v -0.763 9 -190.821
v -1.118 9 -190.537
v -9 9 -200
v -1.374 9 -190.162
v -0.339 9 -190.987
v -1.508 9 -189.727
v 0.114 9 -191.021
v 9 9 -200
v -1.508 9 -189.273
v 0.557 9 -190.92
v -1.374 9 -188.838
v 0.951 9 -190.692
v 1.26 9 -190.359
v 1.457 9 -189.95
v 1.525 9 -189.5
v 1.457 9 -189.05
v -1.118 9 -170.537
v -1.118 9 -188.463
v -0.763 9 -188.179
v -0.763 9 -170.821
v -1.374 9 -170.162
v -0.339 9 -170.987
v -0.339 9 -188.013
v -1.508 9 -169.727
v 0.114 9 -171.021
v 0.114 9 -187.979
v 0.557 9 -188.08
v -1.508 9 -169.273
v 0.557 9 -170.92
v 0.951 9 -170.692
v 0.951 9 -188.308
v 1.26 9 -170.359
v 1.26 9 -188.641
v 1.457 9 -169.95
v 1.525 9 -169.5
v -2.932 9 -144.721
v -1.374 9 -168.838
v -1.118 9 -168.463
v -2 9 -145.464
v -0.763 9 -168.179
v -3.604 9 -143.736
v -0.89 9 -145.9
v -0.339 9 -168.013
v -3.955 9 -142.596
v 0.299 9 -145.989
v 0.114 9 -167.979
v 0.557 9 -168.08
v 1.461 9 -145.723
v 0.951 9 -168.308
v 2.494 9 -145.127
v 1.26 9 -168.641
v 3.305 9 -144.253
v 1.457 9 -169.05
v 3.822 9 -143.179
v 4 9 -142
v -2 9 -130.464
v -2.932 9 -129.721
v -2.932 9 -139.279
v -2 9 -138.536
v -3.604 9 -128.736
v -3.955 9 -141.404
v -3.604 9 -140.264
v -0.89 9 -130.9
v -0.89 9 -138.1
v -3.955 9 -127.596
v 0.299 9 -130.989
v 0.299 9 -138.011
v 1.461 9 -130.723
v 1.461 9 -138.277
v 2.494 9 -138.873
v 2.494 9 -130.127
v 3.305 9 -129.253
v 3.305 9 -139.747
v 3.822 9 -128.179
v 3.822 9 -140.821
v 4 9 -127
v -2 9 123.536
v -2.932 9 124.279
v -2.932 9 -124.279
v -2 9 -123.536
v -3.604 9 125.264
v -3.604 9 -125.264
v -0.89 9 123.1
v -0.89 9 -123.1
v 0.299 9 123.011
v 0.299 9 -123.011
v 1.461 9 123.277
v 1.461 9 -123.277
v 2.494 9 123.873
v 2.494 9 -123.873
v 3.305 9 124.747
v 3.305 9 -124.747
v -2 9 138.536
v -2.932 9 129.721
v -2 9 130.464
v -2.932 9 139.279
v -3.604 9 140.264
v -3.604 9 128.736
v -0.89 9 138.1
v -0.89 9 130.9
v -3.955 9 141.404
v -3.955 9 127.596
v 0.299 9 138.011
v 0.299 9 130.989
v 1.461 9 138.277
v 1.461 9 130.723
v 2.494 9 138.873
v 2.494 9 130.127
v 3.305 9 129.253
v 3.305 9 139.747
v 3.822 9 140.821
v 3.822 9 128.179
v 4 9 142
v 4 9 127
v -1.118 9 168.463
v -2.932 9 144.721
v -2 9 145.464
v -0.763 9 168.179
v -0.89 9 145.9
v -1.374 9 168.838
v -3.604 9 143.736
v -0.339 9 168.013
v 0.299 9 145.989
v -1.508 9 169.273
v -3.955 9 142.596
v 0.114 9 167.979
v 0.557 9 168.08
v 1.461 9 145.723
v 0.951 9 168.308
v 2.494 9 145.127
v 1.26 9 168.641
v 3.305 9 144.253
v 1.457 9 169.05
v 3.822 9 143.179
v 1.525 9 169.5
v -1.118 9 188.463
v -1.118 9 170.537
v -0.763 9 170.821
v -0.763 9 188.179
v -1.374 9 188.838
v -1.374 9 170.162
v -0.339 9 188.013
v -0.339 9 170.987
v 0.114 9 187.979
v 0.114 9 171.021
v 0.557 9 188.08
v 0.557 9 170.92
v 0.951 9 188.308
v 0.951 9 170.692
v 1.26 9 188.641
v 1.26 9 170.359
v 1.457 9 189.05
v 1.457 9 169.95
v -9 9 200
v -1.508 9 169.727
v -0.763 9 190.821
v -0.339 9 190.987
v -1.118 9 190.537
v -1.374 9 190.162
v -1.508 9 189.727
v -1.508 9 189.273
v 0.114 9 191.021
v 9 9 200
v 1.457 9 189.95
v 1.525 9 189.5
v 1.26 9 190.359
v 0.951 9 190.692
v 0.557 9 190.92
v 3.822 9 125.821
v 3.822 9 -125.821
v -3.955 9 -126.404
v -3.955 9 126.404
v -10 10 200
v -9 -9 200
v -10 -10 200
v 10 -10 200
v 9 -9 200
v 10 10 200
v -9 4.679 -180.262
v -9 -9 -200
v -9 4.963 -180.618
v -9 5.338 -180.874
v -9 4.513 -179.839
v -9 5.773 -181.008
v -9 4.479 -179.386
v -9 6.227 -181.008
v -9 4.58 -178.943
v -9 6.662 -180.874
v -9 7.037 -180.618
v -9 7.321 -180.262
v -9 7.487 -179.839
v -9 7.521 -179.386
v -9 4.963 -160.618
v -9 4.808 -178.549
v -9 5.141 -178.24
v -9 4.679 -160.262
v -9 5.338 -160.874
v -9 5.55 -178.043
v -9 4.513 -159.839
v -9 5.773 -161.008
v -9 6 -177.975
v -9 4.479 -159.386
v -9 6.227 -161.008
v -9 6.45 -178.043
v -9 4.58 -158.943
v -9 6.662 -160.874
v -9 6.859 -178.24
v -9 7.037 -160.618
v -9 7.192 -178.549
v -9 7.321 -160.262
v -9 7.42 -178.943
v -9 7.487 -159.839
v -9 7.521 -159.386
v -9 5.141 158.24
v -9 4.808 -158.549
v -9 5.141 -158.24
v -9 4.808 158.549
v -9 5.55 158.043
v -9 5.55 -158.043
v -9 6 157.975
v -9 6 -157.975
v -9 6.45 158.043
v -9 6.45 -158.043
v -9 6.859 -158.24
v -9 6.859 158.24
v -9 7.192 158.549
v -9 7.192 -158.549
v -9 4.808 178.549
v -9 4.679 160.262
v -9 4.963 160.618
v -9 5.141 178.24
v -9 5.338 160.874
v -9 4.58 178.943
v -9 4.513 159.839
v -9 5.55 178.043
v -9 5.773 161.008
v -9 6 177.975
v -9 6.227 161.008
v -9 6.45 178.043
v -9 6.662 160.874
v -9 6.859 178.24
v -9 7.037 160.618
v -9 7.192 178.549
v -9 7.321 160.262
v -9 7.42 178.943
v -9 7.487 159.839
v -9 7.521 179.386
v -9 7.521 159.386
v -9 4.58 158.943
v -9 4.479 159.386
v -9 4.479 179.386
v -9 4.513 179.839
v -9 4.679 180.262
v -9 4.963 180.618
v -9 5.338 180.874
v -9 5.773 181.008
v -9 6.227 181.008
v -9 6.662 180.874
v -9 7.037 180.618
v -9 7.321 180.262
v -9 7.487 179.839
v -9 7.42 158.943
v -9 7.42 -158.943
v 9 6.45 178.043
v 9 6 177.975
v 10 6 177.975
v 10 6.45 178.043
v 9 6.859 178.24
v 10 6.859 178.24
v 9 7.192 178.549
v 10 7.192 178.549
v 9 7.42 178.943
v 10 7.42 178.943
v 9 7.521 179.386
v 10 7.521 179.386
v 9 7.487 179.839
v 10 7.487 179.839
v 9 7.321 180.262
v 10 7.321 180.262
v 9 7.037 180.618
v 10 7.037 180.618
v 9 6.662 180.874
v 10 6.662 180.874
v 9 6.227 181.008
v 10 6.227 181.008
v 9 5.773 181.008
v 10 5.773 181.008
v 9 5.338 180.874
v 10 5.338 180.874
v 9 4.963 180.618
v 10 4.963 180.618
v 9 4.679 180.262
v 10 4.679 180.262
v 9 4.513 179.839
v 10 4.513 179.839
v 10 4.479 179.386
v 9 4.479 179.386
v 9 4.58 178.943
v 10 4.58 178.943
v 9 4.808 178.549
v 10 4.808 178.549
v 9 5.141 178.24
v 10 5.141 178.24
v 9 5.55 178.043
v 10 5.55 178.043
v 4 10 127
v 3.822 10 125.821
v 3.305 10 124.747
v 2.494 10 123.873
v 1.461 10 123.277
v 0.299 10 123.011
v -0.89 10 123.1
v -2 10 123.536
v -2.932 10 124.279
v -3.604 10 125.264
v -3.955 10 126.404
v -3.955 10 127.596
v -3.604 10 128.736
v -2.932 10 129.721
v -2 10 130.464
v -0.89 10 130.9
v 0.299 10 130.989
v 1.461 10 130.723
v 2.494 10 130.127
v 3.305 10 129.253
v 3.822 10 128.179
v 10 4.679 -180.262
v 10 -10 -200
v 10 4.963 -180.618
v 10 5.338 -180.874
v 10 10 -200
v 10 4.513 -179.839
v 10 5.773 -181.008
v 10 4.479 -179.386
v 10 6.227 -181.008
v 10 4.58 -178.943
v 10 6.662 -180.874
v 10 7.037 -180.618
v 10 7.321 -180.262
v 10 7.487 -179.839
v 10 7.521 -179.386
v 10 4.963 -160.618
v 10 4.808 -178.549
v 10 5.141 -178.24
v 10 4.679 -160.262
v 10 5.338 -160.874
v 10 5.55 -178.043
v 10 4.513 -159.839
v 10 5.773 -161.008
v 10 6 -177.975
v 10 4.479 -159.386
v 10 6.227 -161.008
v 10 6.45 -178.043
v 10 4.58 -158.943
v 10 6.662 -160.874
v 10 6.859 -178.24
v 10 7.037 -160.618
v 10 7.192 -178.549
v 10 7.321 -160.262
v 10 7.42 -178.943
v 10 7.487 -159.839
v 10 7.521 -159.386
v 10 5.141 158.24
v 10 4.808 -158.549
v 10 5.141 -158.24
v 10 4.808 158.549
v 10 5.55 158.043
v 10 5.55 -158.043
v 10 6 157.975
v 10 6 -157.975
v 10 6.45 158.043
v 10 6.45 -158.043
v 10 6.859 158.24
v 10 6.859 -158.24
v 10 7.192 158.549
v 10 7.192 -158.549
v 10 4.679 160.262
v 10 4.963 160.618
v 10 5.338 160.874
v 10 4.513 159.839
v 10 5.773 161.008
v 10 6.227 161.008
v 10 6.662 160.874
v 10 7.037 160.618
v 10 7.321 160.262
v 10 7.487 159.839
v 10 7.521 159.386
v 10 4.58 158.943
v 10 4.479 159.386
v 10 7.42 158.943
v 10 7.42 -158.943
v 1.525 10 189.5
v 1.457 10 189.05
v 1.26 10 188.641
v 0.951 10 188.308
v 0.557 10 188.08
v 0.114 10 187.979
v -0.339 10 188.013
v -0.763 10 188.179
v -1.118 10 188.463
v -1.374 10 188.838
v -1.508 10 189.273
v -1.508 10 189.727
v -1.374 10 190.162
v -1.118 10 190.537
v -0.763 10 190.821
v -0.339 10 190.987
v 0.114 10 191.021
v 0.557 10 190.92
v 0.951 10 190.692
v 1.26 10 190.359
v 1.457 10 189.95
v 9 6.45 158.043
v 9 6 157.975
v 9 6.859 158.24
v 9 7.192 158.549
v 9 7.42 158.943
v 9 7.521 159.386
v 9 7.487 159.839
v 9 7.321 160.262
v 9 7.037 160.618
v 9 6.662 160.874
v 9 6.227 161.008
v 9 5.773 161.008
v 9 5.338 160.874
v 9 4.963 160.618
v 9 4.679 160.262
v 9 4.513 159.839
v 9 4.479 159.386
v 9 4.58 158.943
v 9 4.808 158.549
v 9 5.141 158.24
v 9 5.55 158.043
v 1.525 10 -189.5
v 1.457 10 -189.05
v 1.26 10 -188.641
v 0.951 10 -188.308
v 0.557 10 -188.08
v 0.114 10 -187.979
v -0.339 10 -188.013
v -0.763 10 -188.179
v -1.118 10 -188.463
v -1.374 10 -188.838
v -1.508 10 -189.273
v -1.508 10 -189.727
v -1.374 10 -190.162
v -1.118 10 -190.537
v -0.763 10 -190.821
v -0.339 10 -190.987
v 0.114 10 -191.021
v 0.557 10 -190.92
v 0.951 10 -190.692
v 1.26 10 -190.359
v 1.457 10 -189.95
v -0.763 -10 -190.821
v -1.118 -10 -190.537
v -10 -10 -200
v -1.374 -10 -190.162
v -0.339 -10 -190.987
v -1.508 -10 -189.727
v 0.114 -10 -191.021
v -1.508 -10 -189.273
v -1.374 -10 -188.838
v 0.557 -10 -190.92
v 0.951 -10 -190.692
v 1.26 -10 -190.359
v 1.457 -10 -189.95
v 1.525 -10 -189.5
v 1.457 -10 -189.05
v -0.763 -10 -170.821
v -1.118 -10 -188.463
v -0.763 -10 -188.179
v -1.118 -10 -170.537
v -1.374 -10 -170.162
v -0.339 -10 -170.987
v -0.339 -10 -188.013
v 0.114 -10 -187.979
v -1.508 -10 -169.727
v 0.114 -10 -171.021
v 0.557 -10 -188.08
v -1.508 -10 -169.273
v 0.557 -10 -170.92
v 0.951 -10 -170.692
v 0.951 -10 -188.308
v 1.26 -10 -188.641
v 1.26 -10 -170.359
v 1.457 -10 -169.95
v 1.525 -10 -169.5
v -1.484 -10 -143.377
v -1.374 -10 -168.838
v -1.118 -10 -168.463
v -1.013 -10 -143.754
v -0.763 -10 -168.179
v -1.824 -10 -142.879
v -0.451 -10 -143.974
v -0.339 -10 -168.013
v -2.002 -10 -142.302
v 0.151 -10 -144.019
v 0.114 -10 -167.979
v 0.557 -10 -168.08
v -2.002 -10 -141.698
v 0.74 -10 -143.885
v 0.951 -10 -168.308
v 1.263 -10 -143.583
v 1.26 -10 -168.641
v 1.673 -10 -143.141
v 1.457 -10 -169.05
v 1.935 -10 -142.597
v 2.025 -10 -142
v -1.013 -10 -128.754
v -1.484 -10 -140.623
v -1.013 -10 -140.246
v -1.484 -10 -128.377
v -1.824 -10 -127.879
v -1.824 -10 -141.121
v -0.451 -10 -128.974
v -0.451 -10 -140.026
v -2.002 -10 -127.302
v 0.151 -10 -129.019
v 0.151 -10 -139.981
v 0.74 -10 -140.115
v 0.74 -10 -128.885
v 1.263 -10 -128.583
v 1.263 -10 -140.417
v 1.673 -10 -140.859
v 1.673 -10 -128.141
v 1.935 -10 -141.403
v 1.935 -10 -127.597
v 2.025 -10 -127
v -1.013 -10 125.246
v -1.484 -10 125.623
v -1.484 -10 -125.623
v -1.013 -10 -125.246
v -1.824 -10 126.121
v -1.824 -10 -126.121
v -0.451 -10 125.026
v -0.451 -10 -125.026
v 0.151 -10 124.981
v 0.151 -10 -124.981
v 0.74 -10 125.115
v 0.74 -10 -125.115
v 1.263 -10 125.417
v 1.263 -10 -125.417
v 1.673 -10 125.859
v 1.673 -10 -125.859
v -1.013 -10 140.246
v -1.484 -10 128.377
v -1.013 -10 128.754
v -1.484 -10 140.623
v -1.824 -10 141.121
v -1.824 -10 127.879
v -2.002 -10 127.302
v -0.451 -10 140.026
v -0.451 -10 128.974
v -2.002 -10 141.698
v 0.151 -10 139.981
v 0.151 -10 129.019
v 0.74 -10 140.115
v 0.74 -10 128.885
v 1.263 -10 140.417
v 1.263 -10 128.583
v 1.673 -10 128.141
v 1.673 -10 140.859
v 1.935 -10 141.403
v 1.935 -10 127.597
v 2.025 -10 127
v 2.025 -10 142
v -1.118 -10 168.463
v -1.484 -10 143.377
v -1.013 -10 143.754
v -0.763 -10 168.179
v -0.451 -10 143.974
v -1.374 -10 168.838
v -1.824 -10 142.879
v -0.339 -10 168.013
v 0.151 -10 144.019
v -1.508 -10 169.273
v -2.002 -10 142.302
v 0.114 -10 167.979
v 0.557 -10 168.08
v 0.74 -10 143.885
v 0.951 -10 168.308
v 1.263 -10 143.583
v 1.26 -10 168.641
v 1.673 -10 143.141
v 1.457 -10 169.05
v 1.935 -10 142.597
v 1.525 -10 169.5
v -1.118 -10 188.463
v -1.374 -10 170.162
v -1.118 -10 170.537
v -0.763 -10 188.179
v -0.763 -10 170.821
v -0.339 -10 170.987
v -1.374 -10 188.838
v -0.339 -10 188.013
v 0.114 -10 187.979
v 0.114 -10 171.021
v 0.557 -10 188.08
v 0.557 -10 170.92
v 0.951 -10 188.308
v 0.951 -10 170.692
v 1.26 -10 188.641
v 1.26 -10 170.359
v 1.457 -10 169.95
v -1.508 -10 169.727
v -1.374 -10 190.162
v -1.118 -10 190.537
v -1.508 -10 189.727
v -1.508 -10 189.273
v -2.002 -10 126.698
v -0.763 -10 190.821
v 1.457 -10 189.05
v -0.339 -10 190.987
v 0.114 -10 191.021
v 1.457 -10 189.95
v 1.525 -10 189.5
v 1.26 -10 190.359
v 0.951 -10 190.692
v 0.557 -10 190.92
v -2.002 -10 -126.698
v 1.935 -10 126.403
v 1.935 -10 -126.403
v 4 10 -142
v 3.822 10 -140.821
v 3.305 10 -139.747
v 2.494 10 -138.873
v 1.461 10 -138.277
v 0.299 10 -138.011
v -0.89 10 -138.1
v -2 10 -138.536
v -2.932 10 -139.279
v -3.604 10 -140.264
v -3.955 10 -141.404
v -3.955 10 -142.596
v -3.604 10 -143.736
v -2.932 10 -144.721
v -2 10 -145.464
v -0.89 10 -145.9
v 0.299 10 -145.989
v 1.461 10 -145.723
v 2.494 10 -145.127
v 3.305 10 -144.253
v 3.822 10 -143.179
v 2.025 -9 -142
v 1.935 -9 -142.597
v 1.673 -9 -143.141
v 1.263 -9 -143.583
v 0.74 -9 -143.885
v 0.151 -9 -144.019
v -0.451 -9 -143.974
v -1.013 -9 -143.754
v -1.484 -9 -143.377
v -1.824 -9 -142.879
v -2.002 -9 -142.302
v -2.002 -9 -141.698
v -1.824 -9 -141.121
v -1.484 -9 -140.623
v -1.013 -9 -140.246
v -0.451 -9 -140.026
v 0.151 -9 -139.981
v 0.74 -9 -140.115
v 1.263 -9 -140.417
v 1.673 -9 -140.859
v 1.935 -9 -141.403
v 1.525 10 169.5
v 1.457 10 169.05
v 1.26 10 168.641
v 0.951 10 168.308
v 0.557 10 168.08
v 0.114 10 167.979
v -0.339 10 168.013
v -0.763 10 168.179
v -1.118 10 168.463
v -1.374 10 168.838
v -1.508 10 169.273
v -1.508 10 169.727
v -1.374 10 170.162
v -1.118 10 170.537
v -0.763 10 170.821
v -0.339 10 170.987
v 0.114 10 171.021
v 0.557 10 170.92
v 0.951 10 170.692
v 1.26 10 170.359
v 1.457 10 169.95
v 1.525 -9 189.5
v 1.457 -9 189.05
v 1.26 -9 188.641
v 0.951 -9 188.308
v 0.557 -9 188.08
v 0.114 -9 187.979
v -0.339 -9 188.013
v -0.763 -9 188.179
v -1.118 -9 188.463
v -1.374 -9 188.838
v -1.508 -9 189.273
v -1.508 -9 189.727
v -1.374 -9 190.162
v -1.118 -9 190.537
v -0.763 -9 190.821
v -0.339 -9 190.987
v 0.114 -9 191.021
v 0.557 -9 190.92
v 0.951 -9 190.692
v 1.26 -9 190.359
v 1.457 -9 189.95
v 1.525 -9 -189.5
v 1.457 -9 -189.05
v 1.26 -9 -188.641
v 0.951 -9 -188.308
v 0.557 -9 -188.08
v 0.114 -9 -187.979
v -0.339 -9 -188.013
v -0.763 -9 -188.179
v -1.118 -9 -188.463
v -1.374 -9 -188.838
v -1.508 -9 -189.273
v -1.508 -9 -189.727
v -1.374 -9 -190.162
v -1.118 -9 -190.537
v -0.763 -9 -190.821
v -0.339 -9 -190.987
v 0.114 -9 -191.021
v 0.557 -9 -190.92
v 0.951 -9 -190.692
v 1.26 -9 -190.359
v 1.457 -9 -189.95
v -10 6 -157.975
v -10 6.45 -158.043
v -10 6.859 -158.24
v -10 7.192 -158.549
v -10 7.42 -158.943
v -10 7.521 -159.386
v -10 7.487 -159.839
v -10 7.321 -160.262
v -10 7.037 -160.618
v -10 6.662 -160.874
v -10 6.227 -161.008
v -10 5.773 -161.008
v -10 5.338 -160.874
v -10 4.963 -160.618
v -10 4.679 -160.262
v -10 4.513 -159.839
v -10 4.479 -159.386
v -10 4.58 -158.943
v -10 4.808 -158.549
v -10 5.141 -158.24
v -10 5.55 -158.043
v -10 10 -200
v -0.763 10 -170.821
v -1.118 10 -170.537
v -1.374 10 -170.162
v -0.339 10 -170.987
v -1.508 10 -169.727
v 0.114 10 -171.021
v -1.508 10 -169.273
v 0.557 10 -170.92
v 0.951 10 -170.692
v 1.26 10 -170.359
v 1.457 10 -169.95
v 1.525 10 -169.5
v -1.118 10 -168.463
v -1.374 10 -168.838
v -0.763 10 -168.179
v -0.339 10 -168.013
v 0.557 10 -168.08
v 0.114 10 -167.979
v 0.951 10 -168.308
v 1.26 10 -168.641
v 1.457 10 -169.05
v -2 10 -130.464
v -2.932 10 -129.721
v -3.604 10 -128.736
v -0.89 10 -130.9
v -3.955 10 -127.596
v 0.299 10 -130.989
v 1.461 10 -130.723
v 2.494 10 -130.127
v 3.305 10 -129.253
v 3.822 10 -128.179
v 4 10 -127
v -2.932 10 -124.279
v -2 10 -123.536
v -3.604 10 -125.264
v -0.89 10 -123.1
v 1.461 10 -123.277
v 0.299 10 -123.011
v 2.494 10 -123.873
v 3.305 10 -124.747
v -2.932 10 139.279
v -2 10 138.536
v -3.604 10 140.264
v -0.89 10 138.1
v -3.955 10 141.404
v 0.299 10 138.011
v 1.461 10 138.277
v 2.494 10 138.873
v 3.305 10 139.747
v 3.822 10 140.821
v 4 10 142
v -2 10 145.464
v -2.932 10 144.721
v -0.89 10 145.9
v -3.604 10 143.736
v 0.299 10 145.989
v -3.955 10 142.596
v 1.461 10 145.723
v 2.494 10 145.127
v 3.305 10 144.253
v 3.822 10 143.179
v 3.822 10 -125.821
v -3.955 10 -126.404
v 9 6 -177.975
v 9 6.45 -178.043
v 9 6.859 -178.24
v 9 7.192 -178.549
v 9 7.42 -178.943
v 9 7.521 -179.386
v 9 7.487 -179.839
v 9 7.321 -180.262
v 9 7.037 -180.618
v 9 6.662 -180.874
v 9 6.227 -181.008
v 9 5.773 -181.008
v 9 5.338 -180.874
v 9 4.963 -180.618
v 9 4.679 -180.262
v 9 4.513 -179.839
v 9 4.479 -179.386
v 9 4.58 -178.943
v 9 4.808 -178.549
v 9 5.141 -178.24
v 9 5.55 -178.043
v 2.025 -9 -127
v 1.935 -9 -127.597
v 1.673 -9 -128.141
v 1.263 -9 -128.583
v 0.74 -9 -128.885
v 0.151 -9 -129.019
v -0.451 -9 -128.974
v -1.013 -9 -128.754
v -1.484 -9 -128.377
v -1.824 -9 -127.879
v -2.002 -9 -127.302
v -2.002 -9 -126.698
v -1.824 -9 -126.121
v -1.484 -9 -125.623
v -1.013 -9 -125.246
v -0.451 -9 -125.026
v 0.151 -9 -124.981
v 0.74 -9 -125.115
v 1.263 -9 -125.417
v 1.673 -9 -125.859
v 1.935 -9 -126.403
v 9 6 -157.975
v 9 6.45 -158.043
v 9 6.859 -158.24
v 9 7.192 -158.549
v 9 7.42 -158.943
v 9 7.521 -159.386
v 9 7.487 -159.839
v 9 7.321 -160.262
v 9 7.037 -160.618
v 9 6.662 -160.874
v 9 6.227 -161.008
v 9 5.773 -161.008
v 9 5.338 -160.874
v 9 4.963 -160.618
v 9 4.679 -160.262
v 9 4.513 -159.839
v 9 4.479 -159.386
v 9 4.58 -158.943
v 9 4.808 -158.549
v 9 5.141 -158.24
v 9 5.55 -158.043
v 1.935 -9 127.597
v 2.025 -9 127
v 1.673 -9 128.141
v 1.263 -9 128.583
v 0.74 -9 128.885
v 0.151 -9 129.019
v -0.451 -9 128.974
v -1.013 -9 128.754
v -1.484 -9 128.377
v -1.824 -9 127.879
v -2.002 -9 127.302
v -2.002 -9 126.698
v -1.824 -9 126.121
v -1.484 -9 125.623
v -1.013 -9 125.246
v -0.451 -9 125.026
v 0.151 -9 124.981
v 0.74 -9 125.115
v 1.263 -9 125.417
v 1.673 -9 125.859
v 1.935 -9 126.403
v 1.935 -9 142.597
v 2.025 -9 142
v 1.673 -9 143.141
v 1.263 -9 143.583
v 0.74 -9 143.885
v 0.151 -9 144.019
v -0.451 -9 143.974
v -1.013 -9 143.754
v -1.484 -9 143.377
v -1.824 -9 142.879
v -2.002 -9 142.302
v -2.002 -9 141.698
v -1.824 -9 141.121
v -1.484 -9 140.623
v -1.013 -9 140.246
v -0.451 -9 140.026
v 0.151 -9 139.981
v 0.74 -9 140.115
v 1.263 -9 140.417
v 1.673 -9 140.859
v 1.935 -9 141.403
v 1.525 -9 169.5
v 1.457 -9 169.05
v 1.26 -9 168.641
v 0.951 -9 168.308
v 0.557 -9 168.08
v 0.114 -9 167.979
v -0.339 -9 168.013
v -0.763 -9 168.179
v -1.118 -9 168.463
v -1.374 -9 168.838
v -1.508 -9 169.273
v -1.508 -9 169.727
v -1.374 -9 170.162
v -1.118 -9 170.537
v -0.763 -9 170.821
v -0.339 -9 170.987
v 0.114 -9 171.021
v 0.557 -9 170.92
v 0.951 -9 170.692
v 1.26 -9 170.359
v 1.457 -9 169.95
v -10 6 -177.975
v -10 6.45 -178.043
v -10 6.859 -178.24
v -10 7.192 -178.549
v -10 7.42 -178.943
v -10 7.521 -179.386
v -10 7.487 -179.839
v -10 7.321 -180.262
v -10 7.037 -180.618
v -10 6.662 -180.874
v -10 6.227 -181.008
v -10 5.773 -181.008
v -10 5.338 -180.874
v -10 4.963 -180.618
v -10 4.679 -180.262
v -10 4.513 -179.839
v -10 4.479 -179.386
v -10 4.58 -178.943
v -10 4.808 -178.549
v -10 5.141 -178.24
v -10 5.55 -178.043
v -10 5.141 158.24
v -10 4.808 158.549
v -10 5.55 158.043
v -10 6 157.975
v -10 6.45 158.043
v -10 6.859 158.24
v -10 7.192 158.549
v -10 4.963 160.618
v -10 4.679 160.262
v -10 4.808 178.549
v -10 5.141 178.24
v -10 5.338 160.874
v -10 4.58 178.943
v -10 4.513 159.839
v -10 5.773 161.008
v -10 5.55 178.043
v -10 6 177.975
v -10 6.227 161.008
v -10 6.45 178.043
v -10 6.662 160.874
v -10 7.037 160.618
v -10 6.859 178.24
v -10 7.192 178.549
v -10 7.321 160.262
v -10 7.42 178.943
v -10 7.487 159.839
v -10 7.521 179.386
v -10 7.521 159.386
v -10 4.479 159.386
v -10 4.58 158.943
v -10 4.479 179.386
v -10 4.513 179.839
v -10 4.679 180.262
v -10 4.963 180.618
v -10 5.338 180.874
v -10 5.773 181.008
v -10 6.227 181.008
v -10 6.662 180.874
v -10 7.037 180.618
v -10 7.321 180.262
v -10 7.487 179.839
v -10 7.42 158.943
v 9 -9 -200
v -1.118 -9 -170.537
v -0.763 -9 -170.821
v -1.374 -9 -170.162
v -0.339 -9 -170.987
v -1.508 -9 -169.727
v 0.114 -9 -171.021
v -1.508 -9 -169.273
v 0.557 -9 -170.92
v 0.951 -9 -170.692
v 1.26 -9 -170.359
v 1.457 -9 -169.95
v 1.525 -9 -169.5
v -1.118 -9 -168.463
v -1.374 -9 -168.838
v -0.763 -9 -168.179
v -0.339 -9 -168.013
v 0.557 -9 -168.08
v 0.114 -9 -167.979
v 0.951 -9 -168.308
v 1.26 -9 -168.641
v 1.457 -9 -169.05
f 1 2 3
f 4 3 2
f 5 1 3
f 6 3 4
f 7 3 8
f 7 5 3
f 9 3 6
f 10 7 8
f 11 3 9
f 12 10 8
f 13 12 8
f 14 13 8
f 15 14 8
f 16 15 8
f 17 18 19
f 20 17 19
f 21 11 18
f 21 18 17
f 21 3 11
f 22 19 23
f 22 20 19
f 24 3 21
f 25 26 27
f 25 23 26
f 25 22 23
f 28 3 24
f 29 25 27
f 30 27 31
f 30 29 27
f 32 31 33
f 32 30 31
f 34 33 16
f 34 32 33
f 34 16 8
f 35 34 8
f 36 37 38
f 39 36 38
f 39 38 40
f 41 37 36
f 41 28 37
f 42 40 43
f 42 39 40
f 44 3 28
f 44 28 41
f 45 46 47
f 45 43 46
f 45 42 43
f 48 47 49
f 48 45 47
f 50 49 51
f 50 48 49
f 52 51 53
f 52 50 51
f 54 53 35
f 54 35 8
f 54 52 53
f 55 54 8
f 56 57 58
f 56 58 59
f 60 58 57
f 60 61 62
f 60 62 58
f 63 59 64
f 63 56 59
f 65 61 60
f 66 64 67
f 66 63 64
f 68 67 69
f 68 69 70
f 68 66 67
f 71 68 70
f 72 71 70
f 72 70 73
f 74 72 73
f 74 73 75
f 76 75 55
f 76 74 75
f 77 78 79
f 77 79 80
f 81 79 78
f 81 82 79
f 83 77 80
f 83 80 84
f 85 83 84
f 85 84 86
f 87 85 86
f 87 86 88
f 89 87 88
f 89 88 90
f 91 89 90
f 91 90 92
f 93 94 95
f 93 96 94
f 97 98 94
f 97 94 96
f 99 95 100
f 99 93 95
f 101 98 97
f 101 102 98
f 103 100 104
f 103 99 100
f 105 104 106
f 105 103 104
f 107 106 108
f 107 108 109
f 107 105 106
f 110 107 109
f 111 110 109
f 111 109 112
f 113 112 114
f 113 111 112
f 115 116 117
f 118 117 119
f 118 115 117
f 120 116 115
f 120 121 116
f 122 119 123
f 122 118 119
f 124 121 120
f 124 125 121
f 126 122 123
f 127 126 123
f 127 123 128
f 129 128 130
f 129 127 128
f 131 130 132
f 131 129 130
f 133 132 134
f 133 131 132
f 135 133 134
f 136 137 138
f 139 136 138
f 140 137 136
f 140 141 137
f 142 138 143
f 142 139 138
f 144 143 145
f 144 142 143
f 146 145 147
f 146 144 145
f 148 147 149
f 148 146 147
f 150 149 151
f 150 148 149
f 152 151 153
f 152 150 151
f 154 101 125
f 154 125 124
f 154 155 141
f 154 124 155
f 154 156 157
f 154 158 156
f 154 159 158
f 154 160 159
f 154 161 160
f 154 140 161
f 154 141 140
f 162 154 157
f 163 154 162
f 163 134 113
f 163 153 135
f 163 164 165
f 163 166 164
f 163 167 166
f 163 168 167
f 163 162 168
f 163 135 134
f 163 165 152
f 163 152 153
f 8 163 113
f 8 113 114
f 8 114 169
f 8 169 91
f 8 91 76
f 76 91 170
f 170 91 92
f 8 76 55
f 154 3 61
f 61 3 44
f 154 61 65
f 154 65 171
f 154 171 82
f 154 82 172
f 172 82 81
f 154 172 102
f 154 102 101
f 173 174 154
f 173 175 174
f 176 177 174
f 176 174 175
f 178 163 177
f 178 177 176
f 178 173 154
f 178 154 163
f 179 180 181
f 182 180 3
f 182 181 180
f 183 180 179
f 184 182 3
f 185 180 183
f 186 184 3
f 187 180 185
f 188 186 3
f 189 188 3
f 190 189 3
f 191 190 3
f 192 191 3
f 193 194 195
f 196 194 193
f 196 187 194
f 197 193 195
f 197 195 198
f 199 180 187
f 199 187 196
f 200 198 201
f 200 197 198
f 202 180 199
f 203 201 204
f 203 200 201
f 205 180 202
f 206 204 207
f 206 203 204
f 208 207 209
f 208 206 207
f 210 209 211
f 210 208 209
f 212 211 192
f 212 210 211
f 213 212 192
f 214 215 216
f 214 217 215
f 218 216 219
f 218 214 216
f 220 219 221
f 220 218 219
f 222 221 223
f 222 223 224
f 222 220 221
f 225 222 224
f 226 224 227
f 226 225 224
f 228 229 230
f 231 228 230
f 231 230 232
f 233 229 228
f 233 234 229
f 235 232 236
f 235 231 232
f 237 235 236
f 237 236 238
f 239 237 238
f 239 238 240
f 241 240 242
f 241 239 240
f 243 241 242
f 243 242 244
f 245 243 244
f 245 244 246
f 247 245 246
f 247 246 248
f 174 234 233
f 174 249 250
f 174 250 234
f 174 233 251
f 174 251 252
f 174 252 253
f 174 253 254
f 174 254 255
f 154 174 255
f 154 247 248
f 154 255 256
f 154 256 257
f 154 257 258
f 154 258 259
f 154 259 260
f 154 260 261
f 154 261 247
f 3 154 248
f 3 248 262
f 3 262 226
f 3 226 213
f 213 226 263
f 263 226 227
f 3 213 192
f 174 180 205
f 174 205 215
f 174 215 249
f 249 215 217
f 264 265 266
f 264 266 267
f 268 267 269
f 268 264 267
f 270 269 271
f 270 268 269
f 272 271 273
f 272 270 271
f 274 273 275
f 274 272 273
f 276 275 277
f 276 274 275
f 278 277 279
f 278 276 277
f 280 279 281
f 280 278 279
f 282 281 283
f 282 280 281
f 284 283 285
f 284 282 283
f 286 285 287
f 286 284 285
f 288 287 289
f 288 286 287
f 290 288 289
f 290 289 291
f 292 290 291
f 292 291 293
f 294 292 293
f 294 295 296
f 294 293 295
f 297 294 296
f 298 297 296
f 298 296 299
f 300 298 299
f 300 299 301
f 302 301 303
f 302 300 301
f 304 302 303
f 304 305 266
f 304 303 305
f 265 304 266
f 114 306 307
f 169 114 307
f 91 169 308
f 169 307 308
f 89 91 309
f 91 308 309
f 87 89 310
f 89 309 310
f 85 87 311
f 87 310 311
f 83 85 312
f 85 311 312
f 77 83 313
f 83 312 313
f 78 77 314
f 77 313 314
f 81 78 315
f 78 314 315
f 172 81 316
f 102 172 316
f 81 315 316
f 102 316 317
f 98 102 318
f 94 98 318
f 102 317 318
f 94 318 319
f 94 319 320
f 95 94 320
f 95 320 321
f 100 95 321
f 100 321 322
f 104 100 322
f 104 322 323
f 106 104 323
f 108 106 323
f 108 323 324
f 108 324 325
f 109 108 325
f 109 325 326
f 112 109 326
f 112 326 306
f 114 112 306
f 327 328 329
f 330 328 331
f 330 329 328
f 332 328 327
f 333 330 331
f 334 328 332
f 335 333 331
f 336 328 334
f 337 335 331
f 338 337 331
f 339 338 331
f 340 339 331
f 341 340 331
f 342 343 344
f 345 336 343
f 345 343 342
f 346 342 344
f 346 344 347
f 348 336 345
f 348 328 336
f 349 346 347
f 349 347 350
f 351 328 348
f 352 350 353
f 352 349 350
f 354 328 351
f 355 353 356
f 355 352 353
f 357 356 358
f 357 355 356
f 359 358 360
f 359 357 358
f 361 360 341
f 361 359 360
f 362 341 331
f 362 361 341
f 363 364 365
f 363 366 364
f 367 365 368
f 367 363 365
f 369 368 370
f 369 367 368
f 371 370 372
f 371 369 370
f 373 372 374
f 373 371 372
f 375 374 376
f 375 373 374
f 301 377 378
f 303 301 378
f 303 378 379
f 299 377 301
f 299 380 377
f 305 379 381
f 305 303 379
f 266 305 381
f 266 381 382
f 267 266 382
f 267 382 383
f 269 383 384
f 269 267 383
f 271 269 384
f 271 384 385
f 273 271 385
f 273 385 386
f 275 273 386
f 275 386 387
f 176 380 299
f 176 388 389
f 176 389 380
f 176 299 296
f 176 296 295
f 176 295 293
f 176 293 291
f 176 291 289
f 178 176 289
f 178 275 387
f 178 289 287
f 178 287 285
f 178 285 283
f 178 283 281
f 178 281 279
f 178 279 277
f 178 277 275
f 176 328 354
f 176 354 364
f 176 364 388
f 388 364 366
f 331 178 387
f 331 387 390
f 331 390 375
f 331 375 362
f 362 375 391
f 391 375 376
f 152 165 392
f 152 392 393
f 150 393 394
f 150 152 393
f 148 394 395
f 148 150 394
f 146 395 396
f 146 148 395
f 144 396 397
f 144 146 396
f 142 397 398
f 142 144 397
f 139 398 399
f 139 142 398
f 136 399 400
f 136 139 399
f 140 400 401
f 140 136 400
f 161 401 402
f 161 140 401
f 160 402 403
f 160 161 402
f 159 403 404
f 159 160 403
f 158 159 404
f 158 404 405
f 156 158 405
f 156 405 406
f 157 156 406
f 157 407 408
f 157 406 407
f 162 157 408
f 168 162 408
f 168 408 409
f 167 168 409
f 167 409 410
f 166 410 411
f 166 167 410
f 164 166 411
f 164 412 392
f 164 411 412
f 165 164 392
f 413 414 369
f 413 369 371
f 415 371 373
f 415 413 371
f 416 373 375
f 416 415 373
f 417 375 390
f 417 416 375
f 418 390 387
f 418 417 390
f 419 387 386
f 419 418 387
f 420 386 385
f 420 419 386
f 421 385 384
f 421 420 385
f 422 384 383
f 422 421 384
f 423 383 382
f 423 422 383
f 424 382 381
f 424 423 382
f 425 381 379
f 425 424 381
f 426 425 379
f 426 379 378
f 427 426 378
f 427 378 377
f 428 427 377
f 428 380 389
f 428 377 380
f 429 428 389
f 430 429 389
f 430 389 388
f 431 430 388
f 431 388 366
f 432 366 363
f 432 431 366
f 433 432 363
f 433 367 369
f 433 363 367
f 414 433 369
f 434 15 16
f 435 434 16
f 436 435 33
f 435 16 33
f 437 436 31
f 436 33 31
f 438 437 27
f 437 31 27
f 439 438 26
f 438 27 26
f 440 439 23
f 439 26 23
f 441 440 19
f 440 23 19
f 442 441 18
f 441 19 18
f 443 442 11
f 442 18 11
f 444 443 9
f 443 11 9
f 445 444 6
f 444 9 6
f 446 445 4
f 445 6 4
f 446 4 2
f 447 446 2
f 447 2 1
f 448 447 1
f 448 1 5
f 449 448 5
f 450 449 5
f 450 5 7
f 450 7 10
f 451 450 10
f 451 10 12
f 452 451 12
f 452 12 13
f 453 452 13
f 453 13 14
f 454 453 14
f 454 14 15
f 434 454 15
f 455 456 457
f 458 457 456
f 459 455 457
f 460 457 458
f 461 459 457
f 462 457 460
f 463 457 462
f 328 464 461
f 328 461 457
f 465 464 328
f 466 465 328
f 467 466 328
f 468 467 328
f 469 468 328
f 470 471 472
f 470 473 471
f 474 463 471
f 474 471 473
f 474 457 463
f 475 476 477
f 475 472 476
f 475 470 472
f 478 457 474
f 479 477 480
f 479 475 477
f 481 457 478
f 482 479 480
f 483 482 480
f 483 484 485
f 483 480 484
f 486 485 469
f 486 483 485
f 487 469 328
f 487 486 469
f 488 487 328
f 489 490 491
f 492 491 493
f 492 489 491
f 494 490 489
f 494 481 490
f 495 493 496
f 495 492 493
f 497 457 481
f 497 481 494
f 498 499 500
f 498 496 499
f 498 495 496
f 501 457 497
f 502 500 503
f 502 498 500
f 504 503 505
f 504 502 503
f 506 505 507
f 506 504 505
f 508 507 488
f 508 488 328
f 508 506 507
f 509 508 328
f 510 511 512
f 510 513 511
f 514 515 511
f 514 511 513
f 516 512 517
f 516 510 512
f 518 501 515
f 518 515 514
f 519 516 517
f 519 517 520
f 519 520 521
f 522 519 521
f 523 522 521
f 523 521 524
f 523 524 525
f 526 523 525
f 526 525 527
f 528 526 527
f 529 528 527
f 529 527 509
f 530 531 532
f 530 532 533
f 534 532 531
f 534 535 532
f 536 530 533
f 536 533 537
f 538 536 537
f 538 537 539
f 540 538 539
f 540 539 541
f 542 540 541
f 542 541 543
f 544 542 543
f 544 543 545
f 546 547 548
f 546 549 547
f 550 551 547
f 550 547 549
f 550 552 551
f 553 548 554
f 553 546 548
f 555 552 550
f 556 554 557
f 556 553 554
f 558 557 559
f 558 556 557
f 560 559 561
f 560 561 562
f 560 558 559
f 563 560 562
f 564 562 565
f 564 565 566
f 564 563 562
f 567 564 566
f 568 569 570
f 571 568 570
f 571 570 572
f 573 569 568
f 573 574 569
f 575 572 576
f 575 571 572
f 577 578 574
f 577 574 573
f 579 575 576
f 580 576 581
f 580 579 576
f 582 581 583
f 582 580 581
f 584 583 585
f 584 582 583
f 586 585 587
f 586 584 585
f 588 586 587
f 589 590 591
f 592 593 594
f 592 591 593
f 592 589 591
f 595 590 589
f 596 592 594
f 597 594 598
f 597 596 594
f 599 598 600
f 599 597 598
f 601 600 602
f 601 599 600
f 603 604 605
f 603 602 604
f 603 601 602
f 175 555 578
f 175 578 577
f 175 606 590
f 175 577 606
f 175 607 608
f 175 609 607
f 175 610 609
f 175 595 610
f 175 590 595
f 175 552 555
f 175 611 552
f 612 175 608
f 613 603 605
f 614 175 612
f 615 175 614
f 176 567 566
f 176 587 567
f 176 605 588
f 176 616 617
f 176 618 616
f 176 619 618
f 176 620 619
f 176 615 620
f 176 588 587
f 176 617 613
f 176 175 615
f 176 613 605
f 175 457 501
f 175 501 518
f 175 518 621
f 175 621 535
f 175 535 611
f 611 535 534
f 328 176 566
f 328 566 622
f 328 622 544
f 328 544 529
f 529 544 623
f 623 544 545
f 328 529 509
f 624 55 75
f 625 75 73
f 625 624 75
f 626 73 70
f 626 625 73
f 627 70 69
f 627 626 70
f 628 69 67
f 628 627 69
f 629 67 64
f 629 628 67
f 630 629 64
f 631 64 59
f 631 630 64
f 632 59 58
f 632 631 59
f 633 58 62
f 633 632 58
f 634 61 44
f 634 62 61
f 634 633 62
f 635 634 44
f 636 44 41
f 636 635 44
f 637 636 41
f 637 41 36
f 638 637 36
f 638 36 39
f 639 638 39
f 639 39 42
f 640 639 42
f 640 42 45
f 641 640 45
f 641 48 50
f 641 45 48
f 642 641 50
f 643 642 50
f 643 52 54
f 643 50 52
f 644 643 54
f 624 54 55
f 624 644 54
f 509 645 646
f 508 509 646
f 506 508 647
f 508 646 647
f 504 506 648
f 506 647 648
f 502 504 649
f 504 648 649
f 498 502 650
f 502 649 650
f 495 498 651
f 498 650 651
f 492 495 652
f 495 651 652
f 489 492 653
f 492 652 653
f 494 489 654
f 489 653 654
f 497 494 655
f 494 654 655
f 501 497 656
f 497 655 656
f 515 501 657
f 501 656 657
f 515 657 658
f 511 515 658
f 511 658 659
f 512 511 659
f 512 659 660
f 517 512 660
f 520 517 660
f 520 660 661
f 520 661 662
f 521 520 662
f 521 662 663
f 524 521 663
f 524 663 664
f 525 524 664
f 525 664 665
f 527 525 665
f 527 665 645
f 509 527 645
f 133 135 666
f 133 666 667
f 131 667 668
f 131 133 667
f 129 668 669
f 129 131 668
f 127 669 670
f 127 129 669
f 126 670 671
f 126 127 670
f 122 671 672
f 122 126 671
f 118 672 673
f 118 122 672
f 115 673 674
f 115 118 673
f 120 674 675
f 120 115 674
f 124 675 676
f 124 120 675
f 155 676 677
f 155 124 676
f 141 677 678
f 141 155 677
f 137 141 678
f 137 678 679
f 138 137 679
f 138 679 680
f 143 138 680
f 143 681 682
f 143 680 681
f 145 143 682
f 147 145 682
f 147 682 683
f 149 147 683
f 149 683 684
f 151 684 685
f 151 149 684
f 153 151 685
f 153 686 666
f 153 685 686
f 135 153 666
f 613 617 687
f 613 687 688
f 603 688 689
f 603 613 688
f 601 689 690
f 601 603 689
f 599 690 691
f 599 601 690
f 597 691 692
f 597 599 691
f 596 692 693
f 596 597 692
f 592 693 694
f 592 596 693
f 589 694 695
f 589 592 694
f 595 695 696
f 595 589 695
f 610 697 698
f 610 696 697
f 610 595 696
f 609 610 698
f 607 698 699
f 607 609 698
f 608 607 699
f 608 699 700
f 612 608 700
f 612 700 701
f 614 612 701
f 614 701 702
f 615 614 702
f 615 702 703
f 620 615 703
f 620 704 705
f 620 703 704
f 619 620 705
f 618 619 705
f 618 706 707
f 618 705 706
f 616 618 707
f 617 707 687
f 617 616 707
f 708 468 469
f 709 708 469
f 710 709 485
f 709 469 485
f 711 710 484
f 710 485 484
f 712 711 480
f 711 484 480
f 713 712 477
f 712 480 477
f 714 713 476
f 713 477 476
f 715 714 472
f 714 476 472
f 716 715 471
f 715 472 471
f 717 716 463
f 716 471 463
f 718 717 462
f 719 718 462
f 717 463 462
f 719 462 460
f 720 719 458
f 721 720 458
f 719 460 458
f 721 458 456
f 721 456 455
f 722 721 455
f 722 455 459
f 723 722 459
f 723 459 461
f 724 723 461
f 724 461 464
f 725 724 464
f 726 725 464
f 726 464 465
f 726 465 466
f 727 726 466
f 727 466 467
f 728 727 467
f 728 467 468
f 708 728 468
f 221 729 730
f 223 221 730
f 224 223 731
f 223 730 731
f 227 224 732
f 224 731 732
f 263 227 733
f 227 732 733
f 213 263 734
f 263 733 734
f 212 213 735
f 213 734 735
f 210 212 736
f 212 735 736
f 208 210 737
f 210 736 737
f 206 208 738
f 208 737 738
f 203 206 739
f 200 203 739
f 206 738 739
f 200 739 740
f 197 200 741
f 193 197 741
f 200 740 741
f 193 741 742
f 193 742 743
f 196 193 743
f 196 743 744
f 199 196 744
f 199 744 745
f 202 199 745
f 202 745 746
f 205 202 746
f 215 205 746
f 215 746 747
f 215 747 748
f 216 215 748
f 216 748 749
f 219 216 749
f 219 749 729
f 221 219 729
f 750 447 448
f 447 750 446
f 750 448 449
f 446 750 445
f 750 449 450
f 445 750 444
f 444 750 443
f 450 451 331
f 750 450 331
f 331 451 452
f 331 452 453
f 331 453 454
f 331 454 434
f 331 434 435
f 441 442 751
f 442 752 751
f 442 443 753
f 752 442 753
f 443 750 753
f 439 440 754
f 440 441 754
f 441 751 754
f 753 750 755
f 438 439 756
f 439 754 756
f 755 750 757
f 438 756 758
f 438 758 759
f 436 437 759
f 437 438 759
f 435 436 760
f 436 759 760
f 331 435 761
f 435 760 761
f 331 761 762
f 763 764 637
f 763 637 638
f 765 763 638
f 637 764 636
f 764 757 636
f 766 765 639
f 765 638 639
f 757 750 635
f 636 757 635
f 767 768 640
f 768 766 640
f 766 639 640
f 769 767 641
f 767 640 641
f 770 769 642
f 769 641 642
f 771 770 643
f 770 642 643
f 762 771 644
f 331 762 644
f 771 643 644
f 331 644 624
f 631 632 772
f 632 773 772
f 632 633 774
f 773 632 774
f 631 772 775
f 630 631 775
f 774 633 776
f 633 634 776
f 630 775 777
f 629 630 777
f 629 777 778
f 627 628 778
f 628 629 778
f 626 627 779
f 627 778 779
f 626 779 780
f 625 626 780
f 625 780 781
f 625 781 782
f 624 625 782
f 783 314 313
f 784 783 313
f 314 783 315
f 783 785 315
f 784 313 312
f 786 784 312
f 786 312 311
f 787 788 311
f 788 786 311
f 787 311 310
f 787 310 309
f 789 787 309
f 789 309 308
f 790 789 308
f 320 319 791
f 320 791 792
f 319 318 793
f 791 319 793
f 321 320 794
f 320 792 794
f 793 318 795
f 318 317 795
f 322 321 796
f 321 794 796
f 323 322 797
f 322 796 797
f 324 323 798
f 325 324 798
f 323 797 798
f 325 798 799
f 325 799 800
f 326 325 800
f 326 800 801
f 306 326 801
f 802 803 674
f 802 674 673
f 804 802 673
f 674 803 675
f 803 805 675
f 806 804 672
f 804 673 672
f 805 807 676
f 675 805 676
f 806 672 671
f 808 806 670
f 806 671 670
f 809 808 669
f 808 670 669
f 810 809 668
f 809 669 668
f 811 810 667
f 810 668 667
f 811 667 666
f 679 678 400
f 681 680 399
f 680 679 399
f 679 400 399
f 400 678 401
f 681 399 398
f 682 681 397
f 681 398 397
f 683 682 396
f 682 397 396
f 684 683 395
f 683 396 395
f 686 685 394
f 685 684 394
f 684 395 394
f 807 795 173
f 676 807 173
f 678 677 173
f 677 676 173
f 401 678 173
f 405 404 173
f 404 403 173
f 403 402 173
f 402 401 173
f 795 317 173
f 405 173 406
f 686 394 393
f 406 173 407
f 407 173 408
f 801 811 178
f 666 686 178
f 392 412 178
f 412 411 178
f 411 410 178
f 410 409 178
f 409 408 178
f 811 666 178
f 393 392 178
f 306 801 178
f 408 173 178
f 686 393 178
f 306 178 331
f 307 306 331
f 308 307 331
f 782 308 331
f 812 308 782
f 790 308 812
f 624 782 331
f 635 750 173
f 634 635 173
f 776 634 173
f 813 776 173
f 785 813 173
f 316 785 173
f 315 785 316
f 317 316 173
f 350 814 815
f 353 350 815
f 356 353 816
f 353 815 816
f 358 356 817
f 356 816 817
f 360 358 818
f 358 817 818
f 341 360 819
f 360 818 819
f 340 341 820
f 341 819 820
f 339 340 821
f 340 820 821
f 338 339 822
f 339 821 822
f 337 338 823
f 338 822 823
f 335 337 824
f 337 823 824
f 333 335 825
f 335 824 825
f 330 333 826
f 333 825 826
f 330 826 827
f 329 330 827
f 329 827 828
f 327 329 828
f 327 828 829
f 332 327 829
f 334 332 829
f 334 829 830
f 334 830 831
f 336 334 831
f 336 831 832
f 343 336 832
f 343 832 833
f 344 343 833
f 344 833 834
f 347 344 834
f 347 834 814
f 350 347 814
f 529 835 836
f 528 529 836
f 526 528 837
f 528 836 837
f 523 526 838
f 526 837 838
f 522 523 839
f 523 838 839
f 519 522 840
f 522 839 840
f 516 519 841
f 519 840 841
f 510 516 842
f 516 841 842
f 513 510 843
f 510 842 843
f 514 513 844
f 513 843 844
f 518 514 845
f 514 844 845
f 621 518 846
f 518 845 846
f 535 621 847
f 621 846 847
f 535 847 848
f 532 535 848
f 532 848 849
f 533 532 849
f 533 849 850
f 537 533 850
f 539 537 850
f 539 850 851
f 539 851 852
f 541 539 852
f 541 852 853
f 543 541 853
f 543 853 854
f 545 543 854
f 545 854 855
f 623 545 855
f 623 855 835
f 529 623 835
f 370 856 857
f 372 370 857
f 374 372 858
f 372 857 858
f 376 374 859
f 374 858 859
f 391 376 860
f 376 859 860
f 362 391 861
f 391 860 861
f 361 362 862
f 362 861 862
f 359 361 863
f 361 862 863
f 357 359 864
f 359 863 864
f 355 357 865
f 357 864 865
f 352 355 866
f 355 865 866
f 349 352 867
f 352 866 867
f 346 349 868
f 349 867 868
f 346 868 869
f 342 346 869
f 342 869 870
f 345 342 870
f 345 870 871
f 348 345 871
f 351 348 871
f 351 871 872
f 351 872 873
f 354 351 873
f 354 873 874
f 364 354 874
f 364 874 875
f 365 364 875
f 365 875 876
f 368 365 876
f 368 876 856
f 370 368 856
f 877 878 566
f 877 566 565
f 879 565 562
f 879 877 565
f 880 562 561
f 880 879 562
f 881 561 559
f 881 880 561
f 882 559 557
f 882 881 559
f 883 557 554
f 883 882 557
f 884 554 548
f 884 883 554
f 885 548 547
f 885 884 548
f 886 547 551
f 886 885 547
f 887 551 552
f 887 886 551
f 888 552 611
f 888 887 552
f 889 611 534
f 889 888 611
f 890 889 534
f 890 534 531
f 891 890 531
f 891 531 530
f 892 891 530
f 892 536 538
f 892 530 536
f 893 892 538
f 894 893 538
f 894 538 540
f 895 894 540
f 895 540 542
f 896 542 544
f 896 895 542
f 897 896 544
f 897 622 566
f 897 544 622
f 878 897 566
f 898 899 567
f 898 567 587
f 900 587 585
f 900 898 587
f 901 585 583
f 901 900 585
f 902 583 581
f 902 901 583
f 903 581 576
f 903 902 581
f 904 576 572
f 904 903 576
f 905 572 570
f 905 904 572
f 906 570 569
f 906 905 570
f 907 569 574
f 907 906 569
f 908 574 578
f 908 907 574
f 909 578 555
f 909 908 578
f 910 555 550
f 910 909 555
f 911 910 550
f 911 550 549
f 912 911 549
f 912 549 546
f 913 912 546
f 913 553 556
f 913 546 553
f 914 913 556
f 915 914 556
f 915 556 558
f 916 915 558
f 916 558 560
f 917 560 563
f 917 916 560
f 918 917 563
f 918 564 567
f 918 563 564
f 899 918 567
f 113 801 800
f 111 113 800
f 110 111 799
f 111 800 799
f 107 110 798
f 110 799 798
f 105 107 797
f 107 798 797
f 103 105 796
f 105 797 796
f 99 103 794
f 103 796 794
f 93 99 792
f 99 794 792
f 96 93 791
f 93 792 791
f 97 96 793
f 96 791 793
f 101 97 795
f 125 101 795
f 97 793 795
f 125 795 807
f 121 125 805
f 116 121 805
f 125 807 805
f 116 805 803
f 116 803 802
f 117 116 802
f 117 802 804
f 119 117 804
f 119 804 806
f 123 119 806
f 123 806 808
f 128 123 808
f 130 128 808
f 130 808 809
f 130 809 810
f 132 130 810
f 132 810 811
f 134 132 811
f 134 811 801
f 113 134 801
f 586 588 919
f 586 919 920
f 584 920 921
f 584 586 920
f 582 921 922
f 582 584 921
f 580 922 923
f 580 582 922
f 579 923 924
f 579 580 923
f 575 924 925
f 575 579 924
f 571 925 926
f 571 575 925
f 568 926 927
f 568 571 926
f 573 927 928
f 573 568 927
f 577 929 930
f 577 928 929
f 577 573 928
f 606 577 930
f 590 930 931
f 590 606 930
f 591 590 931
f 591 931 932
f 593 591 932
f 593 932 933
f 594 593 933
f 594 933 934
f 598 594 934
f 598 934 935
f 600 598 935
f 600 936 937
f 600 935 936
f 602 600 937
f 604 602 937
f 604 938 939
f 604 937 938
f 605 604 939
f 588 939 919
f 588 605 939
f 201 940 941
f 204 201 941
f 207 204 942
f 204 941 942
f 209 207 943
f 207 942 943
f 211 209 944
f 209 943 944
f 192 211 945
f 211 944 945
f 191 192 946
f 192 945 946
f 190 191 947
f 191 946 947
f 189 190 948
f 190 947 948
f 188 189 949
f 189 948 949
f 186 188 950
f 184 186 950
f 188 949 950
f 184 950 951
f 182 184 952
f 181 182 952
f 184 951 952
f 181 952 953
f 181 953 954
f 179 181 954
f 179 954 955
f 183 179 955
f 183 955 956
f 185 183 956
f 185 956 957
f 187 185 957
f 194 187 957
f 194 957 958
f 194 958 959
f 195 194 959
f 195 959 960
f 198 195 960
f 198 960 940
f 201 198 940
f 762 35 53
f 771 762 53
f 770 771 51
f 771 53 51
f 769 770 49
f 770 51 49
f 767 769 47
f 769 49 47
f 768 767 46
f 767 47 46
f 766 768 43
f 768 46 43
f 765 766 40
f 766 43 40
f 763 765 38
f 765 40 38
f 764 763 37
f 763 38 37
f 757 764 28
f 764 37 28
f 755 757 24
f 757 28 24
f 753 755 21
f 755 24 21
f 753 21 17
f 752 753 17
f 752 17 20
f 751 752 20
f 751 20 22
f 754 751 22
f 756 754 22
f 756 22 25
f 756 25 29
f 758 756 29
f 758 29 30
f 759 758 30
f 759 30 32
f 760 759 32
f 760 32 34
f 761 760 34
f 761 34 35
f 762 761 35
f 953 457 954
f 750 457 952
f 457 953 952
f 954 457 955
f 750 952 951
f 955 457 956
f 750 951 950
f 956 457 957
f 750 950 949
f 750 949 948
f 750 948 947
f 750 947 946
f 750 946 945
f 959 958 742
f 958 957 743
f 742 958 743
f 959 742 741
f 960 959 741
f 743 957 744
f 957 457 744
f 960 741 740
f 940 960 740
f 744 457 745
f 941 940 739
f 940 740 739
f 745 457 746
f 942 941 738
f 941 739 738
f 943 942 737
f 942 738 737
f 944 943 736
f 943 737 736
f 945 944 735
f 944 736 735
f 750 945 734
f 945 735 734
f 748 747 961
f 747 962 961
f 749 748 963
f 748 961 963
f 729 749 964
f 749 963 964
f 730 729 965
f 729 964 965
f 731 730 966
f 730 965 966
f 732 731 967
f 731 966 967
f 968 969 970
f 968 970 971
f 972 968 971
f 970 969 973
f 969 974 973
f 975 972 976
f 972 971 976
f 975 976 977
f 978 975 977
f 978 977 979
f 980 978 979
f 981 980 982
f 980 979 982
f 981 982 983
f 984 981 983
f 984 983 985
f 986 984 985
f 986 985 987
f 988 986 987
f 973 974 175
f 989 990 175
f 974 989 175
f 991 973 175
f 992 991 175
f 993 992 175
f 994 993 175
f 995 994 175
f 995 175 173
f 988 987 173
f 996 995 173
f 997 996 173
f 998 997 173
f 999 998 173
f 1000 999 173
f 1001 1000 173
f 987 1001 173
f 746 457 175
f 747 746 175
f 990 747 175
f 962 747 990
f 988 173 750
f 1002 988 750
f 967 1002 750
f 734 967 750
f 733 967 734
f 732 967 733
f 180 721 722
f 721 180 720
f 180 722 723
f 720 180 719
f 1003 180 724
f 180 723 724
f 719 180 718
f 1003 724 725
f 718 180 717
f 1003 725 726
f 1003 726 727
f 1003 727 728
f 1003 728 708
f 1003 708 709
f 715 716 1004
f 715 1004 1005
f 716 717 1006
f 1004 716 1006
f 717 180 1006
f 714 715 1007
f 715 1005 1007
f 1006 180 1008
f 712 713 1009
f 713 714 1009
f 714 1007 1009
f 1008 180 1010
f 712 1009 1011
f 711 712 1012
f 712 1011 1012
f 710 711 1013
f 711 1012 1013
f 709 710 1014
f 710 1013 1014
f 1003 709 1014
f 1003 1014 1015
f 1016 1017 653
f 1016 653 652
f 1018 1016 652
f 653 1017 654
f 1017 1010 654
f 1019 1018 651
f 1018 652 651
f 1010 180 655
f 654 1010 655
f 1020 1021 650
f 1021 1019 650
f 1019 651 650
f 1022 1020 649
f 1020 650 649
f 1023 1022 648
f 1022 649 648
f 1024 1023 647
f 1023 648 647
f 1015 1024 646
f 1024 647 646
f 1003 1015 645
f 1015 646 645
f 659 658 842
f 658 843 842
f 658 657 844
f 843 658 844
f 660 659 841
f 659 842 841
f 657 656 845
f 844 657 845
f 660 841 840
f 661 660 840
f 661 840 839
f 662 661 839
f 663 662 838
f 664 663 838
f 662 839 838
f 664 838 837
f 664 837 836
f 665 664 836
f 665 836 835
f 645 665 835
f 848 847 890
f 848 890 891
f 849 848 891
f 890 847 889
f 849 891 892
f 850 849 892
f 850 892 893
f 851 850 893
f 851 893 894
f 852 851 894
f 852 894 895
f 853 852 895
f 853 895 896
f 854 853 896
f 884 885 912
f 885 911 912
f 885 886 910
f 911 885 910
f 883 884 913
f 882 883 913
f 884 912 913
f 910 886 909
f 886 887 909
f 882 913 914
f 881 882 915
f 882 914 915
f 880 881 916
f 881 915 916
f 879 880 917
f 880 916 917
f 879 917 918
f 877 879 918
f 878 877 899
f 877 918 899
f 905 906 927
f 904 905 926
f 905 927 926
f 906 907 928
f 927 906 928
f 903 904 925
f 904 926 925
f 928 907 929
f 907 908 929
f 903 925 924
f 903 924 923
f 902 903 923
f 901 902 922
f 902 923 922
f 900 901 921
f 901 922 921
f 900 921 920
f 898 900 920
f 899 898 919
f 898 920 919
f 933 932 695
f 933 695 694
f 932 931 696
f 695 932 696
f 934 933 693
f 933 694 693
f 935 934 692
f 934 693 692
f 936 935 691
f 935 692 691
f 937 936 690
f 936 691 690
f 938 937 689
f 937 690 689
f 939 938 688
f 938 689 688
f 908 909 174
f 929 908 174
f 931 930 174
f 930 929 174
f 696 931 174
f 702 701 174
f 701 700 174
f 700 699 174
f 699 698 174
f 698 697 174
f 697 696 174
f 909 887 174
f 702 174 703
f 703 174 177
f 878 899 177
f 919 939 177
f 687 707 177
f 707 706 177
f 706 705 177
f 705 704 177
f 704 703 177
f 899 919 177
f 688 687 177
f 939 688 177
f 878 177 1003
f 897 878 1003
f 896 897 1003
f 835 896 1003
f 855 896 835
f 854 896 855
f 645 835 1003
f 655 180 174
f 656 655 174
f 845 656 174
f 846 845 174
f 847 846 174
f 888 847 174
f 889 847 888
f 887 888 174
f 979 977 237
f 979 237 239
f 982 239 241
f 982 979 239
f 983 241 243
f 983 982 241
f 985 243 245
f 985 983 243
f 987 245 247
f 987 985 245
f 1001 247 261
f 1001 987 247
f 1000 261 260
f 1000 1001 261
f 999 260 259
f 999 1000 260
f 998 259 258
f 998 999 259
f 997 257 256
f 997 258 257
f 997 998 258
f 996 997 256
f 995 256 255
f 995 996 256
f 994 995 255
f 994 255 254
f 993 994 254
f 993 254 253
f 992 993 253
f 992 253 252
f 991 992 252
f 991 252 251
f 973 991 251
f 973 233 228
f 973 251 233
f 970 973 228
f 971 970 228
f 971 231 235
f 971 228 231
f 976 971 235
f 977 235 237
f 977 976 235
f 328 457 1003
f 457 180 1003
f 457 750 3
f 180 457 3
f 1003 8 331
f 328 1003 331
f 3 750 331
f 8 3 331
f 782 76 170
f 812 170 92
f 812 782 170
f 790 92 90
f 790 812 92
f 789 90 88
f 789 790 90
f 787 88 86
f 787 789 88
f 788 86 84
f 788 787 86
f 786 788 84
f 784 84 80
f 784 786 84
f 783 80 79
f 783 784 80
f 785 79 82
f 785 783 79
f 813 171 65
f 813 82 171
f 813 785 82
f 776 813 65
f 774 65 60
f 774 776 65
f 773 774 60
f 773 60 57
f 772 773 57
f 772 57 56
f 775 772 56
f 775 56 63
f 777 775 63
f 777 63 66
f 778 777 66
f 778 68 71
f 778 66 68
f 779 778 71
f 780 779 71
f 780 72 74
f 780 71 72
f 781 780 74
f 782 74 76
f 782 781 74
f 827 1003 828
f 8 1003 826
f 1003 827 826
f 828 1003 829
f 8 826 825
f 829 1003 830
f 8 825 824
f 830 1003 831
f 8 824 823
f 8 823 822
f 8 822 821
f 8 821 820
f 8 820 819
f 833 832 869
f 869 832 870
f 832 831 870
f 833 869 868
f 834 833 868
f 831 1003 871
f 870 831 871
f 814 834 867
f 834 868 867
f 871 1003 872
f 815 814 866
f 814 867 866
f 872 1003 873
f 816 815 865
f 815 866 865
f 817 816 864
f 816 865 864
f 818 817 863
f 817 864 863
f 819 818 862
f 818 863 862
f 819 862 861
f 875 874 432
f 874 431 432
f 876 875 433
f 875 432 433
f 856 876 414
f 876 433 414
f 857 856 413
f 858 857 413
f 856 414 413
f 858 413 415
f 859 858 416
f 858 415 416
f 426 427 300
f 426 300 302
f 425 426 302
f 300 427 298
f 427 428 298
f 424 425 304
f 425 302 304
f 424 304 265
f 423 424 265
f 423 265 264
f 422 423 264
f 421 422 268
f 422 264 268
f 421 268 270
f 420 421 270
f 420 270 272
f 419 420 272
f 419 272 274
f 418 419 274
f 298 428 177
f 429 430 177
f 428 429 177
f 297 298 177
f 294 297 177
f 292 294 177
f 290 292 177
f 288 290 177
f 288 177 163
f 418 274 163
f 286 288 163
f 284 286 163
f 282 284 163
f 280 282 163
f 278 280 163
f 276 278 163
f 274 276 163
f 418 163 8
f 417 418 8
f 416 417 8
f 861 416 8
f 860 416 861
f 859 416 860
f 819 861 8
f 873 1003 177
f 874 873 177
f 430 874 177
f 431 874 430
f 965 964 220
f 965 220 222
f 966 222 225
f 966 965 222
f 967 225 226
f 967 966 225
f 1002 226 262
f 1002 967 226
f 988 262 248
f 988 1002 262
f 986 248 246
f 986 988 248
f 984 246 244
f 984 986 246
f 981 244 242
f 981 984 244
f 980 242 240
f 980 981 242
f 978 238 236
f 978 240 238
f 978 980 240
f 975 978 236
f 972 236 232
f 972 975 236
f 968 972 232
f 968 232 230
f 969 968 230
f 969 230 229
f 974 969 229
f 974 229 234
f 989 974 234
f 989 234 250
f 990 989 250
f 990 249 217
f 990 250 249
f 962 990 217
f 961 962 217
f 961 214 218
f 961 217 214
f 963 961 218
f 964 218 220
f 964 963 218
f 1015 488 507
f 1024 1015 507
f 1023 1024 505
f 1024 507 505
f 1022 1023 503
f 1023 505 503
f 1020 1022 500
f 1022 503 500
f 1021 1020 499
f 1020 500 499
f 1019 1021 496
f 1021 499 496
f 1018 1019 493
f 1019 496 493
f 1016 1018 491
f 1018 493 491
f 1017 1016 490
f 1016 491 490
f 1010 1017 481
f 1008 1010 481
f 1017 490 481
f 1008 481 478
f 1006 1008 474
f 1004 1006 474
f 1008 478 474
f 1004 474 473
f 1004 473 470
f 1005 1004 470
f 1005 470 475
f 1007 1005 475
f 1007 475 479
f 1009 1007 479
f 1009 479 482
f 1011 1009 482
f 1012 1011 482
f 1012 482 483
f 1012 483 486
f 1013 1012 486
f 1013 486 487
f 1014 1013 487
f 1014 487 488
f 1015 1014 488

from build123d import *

# Parameters (mm, degrees)
SKETCH_1_W               = 20
SKETCH_1_H               = 20
EXTRUDE_1_DEPTH          = 200
SKETCH_2_W               = 18
SKETCH_2_H               = 18
CUT_EXTRUDE_1_DEPTH      = 201
CUT_EXTRUDE_1_DEPTH_BACK = 201
CUT_EXTRUDE_START        = -21
SKETCH_3_R               = 1.525
CUT_EXTRUDE_2_DEPTH      = 22
SKETCH_4_R               = 1.525
CUT_EXTRUDE_3_DEPTH      = 22
SKETCH_5_R               = 2.025
CUT_EXTRUDE_4_DEPTH      = 22
SKETCH_8_R               = 4
CUT_EXTRUDE_5_DEPTH      = 3


with BuildPart() as part:
    # 草图1 → 凸台-拉伸1 (new body, symmetric)
    with BuildSketch(Plane.XY):
        Rectangle(SKETCH_1_W, SKETCH_1_H)
    extrude(amount=EXTRUDE_1_DEPTH, both=True)

    # 草图2 → 切除-拉伸1 (cut, two sides)
    with BuildSketch(Plane.XY) as cut_extrude_1_sk:
        Rectangle(SKETCH_2_W, SKETCH_2_H)
    extrude(amount=CUT_EXTRUDE_1_DEPTH, mode=Mode.SUBTRACT)
    extrude(cut_extrude_1_sk.sketch, amount=-CUT_EXTRUDE_1_DEPTH_BACK, mode=Mode.SUBTRACT)

    # 草图3 → 切除-拉伸2 (cut)
    with BuildSketch(Plane(origin=(0, 10, 0), x_dir=(1, 0, 0), z_dir=(0, 1, 0)).offset(CUT_EXTRUDE_START)):
        with Locations((0, -189.5)):
            Circle(SKETCH_3_R)
        with Locations((0, -169.5)):
            Circle(SKETCH_3_R)
    cut_extrude_2 = extrude(amount=CUT_EXTRUDE_2_DEPTH, mode=Mode.SUBTRACT)

    # 镜向1: 切除-拉伸2 across plane
    add(cut_extrude_2.mirror(Plane.XY), mode=Mode.SUBTRACT)

    # 草图4 → 切除-拉伸3 (cut)
    with BuildSketch(Plane(origin=(10, 0, 0), x_dir=(0, 0, -1), z_dir=(1, 0, 0)).offset(CUT_EXTRUDE_START)):
        with Locations((-179.5, 6)):
            Circle(SKETCH_4_R)
        with Locations((-159.5, 6)):
            Circle(SKETCH_4_R)
    cut_extrude_3 = extrude(amount=CUT_EXTRUDE_3_DEPTH, mode=Mode.SUBTRACT)

    # 草图5 → 切除-拉伸4 (cut)
    with BuildSketch(Plane.XZ.offset(10).offset(CUT_EXTRUDE_START)):
        with Locations((0, 142)):
            Circle(SKETCH_5_R)
        with Locations((0, 127)):
            Circle(SKETCH_5_R)
    cut_extrude_4 = extrude(amount=CUT_EXTRUDE_4_DEPTH, mode=Mode.SUBTRACT)

    # 草图8 → 切除-拉伸5 (cut)
    with BuildSketch(Plane(origin=(0, 10, 0), x_dir=(1, 0, 0), z_dir=(0, 1, 0))):
        with Locations((0, -127)):
            Circle(SKETCH_8_R)
        with Locations((0, -142)):
            Circle(SKETCH_8_R)
    cut_extrude_5 = extrude(amount=-CUT_EXTRUDE_5_DEPTH, mode=Mode.SUBTRACT)

    # 镜向2: 切除-拉伸4, 切除-拉伸5 across plane
    add(cut_extrude_4.mirror(Plane.XY), mode=Mode.SUBTRACT)
    add(cut_extrude_5.mirror(Plane.XY), mode=Mode.SUBTRACT)

    # 镜向3: 切除-拉伸3 across plane
    add(cut_extrude_3.mirror(Plane.XY), mode=Mode.SUBTRACT)


solid = part.part
